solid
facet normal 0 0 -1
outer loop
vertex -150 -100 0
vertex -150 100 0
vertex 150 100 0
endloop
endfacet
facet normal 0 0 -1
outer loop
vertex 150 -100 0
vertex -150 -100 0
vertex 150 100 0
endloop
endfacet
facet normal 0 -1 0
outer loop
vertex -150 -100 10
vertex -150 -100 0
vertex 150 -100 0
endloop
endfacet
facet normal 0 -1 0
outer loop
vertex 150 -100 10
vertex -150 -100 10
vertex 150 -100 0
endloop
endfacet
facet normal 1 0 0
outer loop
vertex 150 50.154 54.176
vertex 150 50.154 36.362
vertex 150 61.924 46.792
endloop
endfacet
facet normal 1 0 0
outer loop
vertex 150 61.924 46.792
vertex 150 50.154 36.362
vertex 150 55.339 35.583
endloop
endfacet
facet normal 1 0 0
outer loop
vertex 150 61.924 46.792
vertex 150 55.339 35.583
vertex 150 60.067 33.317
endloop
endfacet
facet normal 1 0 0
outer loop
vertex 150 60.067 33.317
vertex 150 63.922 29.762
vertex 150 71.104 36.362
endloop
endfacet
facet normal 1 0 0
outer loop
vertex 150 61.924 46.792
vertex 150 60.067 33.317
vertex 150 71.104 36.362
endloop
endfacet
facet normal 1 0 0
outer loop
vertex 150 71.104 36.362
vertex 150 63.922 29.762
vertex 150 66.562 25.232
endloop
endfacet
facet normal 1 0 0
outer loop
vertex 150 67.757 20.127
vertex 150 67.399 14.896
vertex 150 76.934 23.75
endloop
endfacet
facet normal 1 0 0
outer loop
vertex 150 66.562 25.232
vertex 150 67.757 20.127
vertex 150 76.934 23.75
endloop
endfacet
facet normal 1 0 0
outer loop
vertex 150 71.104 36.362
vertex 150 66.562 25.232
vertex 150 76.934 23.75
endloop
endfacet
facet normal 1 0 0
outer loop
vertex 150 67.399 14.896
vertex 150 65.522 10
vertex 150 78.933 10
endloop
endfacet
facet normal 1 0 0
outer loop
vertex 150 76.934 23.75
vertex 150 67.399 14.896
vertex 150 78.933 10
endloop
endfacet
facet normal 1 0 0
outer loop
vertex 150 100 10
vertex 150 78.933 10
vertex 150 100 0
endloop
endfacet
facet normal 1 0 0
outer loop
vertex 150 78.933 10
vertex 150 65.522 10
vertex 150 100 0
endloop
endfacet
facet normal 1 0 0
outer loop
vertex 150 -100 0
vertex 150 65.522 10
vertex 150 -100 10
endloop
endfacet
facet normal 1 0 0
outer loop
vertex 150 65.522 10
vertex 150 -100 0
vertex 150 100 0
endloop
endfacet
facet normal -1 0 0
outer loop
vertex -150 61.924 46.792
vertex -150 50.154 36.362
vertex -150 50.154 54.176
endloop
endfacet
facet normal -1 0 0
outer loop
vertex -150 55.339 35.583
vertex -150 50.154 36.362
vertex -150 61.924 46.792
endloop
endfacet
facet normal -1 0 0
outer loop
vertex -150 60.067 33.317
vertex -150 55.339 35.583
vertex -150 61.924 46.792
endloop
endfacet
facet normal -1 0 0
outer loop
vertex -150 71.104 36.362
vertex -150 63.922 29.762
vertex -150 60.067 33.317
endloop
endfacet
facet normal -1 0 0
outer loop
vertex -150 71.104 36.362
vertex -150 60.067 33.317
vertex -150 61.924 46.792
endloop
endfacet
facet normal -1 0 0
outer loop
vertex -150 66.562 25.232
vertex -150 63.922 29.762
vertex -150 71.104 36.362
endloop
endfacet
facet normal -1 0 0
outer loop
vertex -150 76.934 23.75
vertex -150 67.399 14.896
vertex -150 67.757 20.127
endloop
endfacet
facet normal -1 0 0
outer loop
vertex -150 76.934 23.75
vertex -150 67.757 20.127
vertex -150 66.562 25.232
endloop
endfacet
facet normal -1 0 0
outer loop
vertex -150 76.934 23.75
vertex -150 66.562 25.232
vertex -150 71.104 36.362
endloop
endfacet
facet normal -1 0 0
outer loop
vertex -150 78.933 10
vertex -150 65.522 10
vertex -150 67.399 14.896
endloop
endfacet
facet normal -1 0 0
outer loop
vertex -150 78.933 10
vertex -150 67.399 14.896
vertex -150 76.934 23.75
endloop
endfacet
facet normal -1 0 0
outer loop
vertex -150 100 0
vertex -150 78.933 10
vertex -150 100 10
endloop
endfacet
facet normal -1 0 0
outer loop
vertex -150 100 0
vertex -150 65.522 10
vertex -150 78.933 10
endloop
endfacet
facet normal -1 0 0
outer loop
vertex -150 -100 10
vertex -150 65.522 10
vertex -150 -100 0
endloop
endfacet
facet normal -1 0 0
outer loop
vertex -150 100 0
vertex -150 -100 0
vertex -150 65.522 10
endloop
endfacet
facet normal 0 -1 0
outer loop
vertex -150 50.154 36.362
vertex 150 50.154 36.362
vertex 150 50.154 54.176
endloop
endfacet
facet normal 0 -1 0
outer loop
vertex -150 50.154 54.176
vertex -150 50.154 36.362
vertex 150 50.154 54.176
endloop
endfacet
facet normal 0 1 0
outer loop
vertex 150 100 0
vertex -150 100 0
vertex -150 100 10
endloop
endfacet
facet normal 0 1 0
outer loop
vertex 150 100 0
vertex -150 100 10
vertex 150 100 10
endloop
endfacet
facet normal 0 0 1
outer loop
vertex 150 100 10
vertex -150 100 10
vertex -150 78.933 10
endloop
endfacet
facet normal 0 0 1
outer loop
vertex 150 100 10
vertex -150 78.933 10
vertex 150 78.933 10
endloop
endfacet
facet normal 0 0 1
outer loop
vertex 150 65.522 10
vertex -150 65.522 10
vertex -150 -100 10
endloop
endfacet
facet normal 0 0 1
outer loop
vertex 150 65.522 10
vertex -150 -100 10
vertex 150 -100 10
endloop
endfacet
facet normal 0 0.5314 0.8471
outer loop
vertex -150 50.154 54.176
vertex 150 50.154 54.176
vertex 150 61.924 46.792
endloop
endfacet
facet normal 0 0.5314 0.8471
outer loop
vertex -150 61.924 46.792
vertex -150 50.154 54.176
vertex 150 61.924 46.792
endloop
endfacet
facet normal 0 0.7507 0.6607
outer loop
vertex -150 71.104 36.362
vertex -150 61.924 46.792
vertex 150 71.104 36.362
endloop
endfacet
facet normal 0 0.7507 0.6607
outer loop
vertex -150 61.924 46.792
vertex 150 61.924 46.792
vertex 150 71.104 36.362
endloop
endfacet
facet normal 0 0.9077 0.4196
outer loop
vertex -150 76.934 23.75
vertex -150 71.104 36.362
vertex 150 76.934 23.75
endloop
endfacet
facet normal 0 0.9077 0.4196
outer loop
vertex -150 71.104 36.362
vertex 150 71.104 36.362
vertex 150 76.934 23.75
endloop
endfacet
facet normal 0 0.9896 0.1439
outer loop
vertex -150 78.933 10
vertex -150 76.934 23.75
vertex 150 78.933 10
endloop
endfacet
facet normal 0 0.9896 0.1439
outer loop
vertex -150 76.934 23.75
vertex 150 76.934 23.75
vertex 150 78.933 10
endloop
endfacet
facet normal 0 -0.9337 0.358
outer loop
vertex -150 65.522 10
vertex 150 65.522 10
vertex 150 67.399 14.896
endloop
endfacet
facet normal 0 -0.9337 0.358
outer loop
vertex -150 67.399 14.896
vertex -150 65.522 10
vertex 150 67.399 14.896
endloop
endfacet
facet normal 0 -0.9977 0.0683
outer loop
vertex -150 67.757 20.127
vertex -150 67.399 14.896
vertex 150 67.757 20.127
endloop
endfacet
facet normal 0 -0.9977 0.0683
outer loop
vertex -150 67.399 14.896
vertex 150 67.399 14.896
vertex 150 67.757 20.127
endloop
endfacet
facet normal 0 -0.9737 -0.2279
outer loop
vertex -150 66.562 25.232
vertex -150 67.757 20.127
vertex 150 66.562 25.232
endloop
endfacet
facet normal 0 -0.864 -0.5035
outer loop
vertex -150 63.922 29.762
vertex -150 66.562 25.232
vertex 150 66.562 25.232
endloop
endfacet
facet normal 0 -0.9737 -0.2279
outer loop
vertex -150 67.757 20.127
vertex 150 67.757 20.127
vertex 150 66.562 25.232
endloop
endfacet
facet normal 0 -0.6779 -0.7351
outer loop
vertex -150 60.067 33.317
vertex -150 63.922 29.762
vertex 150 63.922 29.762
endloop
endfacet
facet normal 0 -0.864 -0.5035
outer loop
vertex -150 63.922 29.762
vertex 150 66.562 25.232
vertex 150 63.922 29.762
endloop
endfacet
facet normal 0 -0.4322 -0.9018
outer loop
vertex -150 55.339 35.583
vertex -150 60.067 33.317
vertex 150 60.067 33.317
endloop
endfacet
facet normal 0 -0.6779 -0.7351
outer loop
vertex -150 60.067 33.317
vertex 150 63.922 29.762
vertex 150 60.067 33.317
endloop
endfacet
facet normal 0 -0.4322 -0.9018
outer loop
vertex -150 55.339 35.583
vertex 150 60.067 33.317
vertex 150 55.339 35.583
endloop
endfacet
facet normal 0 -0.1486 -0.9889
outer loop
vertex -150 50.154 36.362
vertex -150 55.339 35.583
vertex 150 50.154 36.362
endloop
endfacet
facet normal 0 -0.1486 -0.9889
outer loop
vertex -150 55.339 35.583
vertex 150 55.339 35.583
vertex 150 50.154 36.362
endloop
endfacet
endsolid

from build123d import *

# Parameters (mm, degrees)
SKETCH1_W           = 300
SKETCH1_H           = 200
BOSS_EXTRUDE1_DEPTH = 10
BOSS_EXTRUDE2_DEPTH = 300


with BuildPart() as part:
    # Sketch1 → Boss-Extrude1 (new body)
    with BuildSketch(Plane.XY):
        Rectangle(SKETCH1_W, SKETCH1_H)
    extrude(amount=BOSS_EXTRUDE1_DEPTH)

    # Sketch4 → Boss-Extrude2 (add)
    with BuildSketch(Plane(origin=(150, 0, 0), x_dir=(0, 0, -1), z_dir=(1, 0, 0))):
        with BuildLine():
            Line((-10, 78.933179658), (-10, 65.521524353))
            ThreePointArc((-10, 65.521524353), (-27.595666073, 65.410986777), (-36.361743784, 50.15400265))
            Line((-36.361743784, 50.15400265), (-54.176069451, 50.15400265))
            ThreePointArc((-54.176069451, 50.15400265), (-36.361743784, 71.103739422), (-10, 78.933179658))
        make_face()
    extrude(amount=-BOSS_EXTRUDE2_DEPTH)


solid = part.part
